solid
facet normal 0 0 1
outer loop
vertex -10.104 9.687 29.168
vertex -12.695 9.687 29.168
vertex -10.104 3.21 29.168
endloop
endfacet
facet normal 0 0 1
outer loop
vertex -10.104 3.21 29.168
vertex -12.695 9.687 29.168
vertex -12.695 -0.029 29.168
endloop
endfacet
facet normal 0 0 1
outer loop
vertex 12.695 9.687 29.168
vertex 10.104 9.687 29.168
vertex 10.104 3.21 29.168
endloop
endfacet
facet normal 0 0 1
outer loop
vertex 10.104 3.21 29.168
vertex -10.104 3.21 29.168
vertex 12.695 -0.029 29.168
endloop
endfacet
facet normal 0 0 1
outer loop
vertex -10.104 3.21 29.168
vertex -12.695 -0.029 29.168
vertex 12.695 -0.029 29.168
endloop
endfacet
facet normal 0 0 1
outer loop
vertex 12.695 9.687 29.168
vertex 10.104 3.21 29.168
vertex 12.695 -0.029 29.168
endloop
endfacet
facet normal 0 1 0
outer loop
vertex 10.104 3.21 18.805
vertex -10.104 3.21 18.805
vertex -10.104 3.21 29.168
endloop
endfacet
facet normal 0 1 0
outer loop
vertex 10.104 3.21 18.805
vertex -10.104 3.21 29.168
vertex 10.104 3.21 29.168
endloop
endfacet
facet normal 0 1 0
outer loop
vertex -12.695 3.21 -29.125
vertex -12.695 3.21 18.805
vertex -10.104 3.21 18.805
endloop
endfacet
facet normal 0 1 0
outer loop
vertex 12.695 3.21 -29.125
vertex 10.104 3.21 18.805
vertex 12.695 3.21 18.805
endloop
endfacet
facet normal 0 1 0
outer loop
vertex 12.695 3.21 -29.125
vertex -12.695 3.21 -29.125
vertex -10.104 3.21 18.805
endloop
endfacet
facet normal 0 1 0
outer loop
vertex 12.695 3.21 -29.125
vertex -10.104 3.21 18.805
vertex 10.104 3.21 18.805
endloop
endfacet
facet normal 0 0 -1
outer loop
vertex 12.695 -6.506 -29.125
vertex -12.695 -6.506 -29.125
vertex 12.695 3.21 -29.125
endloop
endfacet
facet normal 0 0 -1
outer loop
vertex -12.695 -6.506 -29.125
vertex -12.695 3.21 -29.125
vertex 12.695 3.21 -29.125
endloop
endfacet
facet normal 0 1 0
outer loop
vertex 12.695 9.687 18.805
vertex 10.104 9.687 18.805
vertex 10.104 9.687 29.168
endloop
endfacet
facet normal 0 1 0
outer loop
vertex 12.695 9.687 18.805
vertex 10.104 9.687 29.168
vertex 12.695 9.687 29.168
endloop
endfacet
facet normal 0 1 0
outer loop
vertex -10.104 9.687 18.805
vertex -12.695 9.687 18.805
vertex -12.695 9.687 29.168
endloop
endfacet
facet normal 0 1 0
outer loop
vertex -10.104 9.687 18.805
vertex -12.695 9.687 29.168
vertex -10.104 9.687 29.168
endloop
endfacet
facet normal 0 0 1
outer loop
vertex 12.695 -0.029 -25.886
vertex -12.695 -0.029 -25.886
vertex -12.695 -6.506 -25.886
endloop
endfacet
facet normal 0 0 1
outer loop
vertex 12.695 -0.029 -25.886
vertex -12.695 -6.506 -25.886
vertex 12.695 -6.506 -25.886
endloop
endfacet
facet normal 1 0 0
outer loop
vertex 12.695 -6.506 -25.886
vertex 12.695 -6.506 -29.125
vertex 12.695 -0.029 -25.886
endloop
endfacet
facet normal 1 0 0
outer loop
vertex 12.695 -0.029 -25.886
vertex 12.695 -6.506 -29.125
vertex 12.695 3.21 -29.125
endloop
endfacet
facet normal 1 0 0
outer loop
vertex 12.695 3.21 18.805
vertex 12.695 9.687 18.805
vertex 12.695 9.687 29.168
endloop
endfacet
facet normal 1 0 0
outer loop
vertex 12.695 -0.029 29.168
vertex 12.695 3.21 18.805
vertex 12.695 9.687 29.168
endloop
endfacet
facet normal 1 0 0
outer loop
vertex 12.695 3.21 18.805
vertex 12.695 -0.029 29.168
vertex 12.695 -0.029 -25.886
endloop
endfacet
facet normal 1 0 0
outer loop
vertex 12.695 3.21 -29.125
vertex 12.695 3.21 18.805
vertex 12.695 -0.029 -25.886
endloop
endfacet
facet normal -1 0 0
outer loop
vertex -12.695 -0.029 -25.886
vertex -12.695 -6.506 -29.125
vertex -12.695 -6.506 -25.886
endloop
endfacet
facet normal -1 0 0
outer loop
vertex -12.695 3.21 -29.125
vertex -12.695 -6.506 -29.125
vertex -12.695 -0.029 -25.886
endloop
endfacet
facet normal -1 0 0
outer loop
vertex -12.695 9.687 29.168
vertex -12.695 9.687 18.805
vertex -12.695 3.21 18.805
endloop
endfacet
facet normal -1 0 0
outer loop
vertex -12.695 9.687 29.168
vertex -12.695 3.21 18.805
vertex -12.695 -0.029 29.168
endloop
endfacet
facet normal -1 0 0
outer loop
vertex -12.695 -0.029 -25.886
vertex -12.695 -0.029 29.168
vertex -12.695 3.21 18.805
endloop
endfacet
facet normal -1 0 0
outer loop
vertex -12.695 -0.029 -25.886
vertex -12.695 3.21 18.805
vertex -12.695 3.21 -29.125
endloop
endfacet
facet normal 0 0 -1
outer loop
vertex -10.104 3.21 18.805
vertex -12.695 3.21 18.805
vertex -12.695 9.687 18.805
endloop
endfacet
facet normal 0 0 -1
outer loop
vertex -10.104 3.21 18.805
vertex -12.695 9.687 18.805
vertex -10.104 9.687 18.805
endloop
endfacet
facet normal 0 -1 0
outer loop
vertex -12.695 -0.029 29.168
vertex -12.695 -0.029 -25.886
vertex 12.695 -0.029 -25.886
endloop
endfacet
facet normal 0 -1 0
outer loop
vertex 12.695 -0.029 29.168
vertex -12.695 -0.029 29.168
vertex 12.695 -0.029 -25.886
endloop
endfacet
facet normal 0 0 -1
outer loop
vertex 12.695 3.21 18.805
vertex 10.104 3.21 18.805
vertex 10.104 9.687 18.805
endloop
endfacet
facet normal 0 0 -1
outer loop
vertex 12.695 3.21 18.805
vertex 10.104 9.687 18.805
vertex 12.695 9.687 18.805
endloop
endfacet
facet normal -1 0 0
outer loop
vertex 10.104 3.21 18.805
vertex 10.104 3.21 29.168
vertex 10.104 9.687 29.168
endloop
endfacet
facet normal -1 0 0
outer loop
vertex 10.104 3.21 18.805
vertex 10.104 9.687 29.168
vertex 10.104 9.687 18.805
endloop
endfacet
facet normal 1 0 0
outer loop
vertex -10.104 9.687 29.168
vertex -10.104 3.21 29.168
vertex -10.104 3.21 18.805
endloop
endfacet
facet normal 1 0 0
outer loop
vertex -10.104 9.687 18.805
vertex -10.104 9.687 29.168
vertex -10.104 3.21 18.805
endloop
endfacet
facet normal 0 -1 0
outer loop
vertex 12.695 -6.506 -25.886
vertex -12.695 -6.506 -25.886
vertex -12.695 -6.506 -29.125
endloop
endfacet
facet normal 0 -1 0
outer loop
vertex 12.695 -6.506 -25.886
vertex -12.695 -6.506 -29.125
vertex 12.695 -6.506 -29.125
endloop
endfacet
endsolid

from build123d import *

# Parameters (mm, degrees)
SKETCH2_W           = 24.892
SKETCH2_H           = 57.15
BOSS_EXTRUDE1_DEPTH = 3.175
SKETCH3_W           = 2.54
SKETCH3_H           = 10.16
BOSS_EXTRUDE2_DEPTH = 6.35
SKETCH4_W           = 24.892
SKETCH4_H           = 3.175
BOSS_EXTRUDE3_DEPTH = 6.35
SCALE1_SCALE        = 1.02


with BuildPart() as part:
    # Sketch2 → Boss-Extrude1 (new body)
    with BuildSketch(Plane(origin=(0, 0, 0), x_dir=(1, 0, 0), z_dir=(0, 1, 0))):
        Rectangle(SKETCH2_W, SKETCH2_H)
    extrude(amount=BOSS_EXTRUDE1_DEPTH)

    # Sketch3 → Boss-Extrude2 (add)
    with BuildSketch(Plane(origin=(0, 3.175, 0), x_dir=(1, 0, 0), z_dir=(0, 1, 0))):
        with Locations((11.176, -23.495)):
            Rectangle(SKETCH3_W, SKETCH3_H)
        with Locations((-11.176, -23.495)):
            Rectangle(SKETCH3_W, SKETCH3_H)
    extrude(amount=BOSS_EXTRUDE2_DEPTH)

    # Sketch4 → Boss-Extrude3 (add)
    with BuildSketch(Plane.XZ):
        with Locations((0, -26.9875)):
            Rectangle(SKETCH4_W, SKETCH4_H)
    extrude(amount=BOSS_EXTRUDE3_DEPTH)


with BuildPart() as part_1:
    # Scale1: scaled about (0, 1.432399425, -1.093002874)
    add(part.part.scale(SCALE1_SCALE).moved(Location((0, -0.028647989, 0.021860057))))


solid = part_1.part
